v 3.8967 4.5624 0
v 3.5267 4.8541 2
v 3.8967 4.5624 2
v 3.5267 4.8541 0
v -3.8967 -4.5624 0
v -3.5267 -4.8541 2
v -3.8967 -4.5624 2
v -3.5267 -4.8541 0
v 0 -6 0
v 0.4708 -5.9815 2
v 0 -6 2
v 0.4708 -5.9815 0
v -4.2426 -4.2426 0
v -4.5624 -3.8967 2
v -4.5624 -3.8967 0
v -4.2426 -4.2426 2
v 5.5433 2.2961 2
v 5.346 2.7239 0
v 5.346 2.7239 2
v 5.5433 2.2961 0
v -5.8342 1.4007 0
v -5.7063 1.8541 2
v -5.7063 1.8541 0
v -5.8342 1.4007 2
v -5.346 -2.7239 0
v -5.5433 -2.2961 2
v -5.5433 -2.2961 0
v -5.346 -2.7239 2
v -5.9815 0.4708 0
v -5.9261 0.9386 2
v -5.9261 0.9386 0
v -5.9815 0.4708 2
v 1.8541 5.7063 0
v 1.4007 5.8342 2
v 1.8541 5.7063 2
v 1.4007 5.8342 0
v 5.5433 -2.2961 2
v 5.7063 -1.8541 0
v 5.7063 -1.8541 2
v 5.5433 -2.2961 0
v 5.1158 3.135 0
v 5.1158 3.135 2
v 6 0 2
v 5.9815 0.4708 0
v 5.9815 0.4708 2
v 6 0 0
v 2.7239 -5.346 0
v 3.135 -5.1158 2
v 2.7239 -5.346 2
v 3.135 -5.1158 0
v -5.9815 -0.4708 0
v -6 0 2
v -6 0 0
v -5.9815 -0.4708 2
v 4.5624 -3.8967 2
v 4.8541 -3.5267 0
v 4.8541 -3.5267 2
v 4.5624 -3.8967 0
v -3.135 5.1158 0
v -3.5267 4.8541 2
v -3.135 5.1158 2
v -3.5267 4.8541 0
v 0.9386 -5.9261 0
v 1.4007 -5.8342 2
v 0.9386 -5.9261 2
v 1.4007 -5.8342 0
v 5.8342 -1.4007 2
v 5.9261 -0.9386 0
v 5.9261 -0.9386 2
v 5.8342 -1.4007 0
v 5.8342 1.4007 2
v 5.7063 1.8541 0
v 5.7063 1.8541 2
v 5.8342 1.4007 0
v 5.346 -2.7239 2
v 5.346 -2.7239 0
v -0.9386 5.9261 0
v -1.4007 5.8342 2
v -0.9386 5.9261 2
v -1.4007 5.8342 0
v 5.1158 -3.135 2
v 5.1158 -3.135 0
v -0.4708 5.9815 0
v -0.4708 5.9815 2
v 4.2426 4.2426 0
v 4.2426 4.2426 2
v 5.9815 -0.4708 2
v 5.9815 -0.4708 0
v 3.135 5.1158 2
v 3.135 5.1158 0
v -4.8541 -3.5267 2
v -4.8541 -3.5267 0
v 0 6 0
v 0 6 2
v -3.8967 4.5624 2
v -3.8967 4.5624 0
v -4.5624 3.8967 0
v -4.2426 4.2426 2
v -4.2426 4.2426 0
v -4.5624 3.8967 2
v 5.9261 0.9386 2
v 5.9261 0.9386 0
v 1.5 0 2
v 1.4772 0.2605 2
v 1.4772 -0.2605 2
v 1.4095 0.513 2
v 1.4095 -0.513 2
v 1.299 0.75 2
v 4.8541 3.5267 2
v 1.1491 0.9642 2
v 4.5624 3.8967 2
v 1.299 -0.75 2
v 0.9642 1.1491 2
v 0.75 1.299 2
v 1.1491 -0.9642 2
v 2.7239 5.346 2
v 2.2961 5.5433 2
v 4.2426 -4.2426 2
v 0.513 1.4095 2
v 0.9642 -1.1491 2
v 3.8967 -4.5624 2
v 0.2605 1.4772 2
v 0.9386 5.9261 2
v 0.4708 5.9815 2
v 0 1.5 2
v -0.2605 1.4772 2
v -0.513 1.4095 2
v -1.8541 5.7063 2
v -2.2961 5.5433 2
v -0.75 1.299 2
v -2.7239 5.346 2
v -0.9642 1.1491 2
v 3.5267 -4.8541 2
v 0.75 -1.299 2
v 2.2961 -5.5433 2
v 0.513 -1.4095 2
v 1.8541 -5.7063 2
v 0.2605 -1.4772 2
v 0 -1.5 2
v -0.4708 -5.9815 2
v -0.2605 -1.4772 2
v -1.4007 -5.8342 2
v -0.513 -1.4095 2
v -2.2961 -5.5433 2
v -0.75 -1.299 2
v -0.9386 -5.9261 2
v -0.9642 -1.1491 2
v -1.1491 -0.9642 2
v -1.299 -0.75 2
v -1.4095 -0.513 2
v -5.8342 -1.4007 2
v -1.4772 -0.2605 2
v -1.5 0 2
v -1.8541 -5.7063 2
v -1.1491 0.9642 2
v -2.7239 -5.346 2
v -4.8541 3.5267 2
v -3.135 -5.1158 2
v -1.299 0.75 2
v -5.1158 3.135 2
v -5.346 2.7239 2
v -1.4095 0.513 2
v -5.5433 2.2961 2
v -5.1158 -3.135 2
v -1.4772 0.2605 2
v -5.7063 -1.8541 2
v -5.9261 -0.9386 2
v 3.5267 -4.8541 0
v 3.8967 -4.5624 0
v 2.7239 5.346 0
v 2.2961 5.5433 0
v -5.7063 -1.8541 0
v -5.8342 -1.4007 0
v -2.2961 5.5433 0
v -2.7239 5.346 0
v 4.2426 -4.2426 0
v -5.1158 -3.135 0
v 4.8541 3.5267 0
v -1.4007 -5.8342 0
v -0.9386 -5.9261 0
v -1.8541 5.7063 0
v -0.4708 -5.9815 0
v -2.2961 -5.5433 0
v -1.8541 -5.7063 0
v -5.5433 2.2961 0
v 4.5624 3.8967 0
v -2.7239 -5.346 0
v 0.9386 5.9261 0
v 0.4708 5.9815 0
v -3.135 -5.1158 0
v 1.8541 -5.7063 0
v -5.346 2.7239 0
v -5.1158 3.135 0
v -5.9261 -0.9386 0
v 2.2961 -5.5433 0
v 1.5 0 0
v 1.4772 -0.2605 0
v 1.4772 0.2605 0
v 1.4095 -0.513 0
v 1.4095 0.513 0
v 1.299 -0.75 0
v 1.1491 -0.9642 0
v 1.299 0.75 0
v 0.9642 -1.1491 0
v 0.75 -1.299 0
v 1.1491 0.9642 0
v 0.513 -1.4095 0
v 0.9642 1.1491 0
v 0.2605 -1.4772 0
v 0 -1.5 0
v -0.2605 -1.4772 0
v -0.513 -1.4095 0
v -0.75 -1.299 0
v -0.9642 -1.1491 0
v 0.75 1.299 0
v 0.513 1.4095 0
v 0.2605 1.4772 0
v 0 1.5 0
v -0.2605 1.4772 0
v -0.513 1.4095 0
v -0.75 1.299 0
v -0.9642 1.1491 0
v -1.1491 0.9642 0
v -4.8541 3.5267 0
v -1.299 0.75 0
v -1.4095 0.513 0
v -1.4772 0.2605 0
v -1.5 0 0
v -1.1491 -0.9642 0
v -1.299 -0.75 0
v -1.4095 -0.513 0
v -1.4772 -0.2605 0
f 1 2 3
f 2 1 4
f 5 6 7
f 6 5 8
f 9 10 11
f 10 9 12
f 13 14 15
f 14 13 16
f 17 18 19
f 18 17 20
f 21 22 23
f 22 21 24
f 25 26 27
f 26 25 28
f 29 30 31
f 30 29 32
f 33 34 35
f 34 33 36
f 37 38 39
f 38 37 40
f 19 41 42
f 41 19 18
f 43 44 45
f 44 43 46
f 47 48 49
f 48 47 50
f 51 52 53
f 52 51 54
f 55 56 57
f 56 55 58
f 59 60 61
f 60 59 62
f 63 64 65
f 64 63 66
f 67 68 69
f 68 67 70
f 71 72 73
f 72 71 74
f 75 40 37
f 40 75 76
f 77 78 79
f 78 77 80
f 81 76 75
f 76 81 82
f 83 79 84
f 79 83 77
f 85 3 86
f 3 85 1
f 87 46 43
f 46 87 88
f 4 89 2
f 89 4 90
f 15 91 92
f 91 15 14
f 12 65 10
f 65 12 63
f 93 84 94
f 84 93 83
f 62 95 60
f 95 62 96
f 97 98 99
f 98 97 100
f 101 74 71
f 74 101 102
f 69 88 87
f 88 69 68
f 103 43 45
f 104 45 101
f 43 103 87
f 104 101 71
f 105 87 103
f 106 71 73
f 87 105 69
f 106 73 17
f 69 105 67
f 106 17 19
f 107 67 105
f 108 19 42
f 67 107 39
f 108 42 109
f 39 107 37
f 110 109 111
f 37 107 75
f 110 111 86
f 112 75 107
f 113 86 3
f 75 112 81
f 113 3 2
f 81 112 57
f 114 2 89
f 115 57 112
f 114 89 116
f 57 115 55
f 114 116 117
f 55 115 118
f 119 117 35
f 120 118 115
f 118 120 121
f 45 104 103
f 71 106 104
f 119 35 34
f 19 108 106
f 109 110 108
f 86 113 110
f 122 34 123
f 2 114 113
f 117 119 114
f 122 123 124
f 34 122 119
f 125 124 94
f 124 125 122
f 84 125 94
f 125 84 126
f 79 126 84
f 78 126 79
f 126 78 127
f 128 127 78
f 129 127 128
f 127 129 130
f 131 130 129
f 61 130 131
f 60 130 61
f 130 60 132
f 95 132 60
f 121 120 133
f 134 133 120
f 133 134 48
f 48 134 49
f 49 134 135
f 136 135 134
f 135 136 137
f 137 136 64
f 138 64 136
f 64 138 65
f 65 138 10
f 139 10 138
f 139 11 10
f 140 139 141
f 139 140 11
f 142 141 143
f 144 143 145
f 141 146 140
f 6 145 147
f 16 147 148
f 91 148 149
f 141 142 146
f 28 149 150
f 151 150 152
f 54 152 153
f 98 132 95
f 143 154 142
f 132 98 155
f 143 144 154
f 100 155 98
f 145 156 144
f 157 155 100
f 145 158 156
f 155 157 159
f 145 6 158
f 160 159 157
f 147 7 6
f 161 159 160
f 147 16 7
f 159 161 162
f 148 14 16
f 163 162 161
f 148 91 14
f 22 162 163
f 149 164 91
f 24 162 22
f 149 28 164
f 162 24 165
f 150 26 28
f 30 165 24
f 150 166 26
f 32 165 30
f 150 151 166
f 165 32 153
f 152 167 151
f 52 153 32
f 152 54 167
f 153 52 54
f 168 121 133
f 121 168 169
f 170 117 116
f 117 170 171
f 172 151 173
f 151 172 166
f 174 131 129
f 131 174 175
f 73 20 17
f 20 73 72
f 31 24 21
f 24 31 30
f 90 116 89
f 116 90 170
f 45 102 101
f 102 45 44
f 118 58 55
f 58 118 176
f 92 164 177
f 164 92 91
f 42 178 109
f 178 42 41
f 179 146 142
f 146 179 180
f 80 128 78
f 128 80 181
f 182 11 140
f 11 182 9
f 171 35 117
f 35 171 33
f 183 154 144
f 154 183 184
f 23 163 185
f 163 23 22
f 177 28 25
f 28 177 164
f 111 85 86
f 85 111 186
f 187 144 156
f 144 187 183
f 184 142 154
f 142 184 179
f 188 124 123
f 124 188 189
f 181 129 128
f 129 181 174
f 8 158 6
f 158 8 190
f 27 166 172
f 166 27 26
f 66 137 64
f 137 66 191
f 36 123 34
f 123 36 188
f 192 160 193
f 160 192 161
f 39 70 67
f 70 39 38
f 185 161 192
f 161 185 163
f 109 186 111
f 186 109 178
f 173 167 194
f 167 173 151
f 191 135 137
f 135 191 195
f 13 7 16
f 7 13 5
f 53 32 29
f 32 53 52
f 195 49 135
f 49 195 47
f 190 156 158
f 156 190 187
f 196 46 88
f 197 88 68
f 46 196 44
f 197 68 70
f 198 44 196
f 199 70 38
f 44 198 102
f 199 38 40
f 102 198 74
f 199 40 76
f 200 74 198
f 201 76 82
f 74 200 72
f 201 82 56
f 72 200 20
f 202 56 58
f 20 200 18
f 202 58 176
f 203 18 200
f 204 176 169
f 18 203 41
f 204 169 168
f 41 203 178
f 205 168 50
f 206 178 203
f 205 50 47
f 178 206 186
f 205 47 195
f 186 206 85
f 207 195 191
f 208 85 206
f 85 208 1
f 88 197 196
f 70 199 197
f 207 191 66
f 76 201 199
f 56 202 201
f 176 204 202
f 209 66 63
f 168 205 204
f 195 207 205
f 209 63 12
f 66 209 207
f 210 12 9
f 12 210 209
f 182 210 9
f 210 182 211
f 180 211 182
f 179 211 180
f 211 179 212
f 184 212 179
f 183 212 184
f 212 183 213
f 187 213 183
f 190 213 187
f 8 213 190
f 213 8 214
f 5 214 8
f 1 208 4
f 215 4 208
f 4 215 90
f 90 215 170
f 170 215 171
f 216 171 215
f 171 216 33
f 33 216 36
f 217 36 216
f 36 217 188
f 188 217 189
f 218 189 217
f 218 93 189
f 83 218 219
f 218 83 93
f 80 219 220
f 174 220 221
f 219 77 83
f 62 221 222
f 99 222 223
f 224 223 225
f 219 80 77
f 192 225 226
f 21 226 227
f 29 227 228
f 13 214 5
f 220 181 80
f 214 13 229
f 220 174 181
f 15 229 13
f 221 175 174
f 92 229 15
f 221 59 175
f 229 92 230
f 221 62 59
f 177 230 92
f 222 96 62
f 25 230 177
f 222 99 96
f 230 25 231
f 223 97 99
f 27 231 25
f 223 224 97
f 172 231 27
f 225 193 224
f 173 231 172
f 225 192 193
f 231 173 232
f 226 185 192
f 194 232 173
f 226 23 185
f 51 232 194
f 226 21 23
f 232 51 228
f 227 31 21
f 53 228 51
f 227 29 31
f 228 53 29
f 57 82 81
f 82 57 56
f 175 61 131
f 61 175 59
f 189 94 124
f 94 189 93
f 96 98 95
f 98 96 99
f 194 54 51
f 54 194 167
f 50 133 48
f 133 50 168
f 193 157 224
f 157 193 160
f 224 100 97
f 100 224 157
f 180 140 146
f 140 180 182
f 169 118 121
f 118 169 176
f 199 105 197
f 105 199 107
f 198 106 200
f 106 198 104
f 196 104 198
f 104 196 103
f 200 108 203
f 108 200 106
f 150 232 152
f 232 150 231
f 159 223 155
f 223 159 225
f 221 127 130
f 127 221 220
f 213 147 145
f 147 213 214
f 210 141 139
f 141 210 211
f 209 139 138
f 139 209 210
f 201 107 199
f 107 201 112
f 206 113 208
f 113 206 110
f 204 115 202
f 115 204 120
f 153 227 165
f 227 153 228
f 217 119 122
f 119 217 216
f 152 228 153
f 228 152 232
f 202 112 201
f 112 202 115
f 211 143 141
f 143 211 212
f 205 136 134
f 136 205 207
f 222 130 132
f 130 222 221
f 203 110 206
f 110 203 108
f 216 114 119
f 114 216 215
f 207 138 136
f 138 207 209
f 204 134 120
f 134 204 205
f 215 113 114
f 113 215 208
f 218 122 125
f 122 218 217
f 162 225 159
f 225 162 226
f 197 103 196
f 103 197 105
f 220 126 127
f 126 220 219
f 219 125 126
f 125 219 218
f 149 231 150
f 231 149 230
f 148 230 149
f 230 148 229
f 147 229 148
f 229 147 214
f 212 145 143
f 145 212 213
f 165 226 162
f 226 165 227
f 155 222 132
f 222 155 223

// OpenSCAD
// part_id: cp5
// name: Metonic/Saros pointer spacer
// source_drawing_ids: DRW-005
// units: mm
// revision: 0.1
// SPDX-License-Identifier: MIT

module part_cp5(od = 12.0, id = 3.0, th = 2.0) {
    difference() {
        cylinder(d = od, h = th, center = false, $fn = 80);
        translate([0, 0, -0.1]) cylinder(d = id, h = th + 0.2, center = false, $fn = 36);
    }
}

// ---- "main guard" ----
// Default to previewing when opened directly:
if (is_undef(__LIB_MODE__)) {
    part_cp5();
}
